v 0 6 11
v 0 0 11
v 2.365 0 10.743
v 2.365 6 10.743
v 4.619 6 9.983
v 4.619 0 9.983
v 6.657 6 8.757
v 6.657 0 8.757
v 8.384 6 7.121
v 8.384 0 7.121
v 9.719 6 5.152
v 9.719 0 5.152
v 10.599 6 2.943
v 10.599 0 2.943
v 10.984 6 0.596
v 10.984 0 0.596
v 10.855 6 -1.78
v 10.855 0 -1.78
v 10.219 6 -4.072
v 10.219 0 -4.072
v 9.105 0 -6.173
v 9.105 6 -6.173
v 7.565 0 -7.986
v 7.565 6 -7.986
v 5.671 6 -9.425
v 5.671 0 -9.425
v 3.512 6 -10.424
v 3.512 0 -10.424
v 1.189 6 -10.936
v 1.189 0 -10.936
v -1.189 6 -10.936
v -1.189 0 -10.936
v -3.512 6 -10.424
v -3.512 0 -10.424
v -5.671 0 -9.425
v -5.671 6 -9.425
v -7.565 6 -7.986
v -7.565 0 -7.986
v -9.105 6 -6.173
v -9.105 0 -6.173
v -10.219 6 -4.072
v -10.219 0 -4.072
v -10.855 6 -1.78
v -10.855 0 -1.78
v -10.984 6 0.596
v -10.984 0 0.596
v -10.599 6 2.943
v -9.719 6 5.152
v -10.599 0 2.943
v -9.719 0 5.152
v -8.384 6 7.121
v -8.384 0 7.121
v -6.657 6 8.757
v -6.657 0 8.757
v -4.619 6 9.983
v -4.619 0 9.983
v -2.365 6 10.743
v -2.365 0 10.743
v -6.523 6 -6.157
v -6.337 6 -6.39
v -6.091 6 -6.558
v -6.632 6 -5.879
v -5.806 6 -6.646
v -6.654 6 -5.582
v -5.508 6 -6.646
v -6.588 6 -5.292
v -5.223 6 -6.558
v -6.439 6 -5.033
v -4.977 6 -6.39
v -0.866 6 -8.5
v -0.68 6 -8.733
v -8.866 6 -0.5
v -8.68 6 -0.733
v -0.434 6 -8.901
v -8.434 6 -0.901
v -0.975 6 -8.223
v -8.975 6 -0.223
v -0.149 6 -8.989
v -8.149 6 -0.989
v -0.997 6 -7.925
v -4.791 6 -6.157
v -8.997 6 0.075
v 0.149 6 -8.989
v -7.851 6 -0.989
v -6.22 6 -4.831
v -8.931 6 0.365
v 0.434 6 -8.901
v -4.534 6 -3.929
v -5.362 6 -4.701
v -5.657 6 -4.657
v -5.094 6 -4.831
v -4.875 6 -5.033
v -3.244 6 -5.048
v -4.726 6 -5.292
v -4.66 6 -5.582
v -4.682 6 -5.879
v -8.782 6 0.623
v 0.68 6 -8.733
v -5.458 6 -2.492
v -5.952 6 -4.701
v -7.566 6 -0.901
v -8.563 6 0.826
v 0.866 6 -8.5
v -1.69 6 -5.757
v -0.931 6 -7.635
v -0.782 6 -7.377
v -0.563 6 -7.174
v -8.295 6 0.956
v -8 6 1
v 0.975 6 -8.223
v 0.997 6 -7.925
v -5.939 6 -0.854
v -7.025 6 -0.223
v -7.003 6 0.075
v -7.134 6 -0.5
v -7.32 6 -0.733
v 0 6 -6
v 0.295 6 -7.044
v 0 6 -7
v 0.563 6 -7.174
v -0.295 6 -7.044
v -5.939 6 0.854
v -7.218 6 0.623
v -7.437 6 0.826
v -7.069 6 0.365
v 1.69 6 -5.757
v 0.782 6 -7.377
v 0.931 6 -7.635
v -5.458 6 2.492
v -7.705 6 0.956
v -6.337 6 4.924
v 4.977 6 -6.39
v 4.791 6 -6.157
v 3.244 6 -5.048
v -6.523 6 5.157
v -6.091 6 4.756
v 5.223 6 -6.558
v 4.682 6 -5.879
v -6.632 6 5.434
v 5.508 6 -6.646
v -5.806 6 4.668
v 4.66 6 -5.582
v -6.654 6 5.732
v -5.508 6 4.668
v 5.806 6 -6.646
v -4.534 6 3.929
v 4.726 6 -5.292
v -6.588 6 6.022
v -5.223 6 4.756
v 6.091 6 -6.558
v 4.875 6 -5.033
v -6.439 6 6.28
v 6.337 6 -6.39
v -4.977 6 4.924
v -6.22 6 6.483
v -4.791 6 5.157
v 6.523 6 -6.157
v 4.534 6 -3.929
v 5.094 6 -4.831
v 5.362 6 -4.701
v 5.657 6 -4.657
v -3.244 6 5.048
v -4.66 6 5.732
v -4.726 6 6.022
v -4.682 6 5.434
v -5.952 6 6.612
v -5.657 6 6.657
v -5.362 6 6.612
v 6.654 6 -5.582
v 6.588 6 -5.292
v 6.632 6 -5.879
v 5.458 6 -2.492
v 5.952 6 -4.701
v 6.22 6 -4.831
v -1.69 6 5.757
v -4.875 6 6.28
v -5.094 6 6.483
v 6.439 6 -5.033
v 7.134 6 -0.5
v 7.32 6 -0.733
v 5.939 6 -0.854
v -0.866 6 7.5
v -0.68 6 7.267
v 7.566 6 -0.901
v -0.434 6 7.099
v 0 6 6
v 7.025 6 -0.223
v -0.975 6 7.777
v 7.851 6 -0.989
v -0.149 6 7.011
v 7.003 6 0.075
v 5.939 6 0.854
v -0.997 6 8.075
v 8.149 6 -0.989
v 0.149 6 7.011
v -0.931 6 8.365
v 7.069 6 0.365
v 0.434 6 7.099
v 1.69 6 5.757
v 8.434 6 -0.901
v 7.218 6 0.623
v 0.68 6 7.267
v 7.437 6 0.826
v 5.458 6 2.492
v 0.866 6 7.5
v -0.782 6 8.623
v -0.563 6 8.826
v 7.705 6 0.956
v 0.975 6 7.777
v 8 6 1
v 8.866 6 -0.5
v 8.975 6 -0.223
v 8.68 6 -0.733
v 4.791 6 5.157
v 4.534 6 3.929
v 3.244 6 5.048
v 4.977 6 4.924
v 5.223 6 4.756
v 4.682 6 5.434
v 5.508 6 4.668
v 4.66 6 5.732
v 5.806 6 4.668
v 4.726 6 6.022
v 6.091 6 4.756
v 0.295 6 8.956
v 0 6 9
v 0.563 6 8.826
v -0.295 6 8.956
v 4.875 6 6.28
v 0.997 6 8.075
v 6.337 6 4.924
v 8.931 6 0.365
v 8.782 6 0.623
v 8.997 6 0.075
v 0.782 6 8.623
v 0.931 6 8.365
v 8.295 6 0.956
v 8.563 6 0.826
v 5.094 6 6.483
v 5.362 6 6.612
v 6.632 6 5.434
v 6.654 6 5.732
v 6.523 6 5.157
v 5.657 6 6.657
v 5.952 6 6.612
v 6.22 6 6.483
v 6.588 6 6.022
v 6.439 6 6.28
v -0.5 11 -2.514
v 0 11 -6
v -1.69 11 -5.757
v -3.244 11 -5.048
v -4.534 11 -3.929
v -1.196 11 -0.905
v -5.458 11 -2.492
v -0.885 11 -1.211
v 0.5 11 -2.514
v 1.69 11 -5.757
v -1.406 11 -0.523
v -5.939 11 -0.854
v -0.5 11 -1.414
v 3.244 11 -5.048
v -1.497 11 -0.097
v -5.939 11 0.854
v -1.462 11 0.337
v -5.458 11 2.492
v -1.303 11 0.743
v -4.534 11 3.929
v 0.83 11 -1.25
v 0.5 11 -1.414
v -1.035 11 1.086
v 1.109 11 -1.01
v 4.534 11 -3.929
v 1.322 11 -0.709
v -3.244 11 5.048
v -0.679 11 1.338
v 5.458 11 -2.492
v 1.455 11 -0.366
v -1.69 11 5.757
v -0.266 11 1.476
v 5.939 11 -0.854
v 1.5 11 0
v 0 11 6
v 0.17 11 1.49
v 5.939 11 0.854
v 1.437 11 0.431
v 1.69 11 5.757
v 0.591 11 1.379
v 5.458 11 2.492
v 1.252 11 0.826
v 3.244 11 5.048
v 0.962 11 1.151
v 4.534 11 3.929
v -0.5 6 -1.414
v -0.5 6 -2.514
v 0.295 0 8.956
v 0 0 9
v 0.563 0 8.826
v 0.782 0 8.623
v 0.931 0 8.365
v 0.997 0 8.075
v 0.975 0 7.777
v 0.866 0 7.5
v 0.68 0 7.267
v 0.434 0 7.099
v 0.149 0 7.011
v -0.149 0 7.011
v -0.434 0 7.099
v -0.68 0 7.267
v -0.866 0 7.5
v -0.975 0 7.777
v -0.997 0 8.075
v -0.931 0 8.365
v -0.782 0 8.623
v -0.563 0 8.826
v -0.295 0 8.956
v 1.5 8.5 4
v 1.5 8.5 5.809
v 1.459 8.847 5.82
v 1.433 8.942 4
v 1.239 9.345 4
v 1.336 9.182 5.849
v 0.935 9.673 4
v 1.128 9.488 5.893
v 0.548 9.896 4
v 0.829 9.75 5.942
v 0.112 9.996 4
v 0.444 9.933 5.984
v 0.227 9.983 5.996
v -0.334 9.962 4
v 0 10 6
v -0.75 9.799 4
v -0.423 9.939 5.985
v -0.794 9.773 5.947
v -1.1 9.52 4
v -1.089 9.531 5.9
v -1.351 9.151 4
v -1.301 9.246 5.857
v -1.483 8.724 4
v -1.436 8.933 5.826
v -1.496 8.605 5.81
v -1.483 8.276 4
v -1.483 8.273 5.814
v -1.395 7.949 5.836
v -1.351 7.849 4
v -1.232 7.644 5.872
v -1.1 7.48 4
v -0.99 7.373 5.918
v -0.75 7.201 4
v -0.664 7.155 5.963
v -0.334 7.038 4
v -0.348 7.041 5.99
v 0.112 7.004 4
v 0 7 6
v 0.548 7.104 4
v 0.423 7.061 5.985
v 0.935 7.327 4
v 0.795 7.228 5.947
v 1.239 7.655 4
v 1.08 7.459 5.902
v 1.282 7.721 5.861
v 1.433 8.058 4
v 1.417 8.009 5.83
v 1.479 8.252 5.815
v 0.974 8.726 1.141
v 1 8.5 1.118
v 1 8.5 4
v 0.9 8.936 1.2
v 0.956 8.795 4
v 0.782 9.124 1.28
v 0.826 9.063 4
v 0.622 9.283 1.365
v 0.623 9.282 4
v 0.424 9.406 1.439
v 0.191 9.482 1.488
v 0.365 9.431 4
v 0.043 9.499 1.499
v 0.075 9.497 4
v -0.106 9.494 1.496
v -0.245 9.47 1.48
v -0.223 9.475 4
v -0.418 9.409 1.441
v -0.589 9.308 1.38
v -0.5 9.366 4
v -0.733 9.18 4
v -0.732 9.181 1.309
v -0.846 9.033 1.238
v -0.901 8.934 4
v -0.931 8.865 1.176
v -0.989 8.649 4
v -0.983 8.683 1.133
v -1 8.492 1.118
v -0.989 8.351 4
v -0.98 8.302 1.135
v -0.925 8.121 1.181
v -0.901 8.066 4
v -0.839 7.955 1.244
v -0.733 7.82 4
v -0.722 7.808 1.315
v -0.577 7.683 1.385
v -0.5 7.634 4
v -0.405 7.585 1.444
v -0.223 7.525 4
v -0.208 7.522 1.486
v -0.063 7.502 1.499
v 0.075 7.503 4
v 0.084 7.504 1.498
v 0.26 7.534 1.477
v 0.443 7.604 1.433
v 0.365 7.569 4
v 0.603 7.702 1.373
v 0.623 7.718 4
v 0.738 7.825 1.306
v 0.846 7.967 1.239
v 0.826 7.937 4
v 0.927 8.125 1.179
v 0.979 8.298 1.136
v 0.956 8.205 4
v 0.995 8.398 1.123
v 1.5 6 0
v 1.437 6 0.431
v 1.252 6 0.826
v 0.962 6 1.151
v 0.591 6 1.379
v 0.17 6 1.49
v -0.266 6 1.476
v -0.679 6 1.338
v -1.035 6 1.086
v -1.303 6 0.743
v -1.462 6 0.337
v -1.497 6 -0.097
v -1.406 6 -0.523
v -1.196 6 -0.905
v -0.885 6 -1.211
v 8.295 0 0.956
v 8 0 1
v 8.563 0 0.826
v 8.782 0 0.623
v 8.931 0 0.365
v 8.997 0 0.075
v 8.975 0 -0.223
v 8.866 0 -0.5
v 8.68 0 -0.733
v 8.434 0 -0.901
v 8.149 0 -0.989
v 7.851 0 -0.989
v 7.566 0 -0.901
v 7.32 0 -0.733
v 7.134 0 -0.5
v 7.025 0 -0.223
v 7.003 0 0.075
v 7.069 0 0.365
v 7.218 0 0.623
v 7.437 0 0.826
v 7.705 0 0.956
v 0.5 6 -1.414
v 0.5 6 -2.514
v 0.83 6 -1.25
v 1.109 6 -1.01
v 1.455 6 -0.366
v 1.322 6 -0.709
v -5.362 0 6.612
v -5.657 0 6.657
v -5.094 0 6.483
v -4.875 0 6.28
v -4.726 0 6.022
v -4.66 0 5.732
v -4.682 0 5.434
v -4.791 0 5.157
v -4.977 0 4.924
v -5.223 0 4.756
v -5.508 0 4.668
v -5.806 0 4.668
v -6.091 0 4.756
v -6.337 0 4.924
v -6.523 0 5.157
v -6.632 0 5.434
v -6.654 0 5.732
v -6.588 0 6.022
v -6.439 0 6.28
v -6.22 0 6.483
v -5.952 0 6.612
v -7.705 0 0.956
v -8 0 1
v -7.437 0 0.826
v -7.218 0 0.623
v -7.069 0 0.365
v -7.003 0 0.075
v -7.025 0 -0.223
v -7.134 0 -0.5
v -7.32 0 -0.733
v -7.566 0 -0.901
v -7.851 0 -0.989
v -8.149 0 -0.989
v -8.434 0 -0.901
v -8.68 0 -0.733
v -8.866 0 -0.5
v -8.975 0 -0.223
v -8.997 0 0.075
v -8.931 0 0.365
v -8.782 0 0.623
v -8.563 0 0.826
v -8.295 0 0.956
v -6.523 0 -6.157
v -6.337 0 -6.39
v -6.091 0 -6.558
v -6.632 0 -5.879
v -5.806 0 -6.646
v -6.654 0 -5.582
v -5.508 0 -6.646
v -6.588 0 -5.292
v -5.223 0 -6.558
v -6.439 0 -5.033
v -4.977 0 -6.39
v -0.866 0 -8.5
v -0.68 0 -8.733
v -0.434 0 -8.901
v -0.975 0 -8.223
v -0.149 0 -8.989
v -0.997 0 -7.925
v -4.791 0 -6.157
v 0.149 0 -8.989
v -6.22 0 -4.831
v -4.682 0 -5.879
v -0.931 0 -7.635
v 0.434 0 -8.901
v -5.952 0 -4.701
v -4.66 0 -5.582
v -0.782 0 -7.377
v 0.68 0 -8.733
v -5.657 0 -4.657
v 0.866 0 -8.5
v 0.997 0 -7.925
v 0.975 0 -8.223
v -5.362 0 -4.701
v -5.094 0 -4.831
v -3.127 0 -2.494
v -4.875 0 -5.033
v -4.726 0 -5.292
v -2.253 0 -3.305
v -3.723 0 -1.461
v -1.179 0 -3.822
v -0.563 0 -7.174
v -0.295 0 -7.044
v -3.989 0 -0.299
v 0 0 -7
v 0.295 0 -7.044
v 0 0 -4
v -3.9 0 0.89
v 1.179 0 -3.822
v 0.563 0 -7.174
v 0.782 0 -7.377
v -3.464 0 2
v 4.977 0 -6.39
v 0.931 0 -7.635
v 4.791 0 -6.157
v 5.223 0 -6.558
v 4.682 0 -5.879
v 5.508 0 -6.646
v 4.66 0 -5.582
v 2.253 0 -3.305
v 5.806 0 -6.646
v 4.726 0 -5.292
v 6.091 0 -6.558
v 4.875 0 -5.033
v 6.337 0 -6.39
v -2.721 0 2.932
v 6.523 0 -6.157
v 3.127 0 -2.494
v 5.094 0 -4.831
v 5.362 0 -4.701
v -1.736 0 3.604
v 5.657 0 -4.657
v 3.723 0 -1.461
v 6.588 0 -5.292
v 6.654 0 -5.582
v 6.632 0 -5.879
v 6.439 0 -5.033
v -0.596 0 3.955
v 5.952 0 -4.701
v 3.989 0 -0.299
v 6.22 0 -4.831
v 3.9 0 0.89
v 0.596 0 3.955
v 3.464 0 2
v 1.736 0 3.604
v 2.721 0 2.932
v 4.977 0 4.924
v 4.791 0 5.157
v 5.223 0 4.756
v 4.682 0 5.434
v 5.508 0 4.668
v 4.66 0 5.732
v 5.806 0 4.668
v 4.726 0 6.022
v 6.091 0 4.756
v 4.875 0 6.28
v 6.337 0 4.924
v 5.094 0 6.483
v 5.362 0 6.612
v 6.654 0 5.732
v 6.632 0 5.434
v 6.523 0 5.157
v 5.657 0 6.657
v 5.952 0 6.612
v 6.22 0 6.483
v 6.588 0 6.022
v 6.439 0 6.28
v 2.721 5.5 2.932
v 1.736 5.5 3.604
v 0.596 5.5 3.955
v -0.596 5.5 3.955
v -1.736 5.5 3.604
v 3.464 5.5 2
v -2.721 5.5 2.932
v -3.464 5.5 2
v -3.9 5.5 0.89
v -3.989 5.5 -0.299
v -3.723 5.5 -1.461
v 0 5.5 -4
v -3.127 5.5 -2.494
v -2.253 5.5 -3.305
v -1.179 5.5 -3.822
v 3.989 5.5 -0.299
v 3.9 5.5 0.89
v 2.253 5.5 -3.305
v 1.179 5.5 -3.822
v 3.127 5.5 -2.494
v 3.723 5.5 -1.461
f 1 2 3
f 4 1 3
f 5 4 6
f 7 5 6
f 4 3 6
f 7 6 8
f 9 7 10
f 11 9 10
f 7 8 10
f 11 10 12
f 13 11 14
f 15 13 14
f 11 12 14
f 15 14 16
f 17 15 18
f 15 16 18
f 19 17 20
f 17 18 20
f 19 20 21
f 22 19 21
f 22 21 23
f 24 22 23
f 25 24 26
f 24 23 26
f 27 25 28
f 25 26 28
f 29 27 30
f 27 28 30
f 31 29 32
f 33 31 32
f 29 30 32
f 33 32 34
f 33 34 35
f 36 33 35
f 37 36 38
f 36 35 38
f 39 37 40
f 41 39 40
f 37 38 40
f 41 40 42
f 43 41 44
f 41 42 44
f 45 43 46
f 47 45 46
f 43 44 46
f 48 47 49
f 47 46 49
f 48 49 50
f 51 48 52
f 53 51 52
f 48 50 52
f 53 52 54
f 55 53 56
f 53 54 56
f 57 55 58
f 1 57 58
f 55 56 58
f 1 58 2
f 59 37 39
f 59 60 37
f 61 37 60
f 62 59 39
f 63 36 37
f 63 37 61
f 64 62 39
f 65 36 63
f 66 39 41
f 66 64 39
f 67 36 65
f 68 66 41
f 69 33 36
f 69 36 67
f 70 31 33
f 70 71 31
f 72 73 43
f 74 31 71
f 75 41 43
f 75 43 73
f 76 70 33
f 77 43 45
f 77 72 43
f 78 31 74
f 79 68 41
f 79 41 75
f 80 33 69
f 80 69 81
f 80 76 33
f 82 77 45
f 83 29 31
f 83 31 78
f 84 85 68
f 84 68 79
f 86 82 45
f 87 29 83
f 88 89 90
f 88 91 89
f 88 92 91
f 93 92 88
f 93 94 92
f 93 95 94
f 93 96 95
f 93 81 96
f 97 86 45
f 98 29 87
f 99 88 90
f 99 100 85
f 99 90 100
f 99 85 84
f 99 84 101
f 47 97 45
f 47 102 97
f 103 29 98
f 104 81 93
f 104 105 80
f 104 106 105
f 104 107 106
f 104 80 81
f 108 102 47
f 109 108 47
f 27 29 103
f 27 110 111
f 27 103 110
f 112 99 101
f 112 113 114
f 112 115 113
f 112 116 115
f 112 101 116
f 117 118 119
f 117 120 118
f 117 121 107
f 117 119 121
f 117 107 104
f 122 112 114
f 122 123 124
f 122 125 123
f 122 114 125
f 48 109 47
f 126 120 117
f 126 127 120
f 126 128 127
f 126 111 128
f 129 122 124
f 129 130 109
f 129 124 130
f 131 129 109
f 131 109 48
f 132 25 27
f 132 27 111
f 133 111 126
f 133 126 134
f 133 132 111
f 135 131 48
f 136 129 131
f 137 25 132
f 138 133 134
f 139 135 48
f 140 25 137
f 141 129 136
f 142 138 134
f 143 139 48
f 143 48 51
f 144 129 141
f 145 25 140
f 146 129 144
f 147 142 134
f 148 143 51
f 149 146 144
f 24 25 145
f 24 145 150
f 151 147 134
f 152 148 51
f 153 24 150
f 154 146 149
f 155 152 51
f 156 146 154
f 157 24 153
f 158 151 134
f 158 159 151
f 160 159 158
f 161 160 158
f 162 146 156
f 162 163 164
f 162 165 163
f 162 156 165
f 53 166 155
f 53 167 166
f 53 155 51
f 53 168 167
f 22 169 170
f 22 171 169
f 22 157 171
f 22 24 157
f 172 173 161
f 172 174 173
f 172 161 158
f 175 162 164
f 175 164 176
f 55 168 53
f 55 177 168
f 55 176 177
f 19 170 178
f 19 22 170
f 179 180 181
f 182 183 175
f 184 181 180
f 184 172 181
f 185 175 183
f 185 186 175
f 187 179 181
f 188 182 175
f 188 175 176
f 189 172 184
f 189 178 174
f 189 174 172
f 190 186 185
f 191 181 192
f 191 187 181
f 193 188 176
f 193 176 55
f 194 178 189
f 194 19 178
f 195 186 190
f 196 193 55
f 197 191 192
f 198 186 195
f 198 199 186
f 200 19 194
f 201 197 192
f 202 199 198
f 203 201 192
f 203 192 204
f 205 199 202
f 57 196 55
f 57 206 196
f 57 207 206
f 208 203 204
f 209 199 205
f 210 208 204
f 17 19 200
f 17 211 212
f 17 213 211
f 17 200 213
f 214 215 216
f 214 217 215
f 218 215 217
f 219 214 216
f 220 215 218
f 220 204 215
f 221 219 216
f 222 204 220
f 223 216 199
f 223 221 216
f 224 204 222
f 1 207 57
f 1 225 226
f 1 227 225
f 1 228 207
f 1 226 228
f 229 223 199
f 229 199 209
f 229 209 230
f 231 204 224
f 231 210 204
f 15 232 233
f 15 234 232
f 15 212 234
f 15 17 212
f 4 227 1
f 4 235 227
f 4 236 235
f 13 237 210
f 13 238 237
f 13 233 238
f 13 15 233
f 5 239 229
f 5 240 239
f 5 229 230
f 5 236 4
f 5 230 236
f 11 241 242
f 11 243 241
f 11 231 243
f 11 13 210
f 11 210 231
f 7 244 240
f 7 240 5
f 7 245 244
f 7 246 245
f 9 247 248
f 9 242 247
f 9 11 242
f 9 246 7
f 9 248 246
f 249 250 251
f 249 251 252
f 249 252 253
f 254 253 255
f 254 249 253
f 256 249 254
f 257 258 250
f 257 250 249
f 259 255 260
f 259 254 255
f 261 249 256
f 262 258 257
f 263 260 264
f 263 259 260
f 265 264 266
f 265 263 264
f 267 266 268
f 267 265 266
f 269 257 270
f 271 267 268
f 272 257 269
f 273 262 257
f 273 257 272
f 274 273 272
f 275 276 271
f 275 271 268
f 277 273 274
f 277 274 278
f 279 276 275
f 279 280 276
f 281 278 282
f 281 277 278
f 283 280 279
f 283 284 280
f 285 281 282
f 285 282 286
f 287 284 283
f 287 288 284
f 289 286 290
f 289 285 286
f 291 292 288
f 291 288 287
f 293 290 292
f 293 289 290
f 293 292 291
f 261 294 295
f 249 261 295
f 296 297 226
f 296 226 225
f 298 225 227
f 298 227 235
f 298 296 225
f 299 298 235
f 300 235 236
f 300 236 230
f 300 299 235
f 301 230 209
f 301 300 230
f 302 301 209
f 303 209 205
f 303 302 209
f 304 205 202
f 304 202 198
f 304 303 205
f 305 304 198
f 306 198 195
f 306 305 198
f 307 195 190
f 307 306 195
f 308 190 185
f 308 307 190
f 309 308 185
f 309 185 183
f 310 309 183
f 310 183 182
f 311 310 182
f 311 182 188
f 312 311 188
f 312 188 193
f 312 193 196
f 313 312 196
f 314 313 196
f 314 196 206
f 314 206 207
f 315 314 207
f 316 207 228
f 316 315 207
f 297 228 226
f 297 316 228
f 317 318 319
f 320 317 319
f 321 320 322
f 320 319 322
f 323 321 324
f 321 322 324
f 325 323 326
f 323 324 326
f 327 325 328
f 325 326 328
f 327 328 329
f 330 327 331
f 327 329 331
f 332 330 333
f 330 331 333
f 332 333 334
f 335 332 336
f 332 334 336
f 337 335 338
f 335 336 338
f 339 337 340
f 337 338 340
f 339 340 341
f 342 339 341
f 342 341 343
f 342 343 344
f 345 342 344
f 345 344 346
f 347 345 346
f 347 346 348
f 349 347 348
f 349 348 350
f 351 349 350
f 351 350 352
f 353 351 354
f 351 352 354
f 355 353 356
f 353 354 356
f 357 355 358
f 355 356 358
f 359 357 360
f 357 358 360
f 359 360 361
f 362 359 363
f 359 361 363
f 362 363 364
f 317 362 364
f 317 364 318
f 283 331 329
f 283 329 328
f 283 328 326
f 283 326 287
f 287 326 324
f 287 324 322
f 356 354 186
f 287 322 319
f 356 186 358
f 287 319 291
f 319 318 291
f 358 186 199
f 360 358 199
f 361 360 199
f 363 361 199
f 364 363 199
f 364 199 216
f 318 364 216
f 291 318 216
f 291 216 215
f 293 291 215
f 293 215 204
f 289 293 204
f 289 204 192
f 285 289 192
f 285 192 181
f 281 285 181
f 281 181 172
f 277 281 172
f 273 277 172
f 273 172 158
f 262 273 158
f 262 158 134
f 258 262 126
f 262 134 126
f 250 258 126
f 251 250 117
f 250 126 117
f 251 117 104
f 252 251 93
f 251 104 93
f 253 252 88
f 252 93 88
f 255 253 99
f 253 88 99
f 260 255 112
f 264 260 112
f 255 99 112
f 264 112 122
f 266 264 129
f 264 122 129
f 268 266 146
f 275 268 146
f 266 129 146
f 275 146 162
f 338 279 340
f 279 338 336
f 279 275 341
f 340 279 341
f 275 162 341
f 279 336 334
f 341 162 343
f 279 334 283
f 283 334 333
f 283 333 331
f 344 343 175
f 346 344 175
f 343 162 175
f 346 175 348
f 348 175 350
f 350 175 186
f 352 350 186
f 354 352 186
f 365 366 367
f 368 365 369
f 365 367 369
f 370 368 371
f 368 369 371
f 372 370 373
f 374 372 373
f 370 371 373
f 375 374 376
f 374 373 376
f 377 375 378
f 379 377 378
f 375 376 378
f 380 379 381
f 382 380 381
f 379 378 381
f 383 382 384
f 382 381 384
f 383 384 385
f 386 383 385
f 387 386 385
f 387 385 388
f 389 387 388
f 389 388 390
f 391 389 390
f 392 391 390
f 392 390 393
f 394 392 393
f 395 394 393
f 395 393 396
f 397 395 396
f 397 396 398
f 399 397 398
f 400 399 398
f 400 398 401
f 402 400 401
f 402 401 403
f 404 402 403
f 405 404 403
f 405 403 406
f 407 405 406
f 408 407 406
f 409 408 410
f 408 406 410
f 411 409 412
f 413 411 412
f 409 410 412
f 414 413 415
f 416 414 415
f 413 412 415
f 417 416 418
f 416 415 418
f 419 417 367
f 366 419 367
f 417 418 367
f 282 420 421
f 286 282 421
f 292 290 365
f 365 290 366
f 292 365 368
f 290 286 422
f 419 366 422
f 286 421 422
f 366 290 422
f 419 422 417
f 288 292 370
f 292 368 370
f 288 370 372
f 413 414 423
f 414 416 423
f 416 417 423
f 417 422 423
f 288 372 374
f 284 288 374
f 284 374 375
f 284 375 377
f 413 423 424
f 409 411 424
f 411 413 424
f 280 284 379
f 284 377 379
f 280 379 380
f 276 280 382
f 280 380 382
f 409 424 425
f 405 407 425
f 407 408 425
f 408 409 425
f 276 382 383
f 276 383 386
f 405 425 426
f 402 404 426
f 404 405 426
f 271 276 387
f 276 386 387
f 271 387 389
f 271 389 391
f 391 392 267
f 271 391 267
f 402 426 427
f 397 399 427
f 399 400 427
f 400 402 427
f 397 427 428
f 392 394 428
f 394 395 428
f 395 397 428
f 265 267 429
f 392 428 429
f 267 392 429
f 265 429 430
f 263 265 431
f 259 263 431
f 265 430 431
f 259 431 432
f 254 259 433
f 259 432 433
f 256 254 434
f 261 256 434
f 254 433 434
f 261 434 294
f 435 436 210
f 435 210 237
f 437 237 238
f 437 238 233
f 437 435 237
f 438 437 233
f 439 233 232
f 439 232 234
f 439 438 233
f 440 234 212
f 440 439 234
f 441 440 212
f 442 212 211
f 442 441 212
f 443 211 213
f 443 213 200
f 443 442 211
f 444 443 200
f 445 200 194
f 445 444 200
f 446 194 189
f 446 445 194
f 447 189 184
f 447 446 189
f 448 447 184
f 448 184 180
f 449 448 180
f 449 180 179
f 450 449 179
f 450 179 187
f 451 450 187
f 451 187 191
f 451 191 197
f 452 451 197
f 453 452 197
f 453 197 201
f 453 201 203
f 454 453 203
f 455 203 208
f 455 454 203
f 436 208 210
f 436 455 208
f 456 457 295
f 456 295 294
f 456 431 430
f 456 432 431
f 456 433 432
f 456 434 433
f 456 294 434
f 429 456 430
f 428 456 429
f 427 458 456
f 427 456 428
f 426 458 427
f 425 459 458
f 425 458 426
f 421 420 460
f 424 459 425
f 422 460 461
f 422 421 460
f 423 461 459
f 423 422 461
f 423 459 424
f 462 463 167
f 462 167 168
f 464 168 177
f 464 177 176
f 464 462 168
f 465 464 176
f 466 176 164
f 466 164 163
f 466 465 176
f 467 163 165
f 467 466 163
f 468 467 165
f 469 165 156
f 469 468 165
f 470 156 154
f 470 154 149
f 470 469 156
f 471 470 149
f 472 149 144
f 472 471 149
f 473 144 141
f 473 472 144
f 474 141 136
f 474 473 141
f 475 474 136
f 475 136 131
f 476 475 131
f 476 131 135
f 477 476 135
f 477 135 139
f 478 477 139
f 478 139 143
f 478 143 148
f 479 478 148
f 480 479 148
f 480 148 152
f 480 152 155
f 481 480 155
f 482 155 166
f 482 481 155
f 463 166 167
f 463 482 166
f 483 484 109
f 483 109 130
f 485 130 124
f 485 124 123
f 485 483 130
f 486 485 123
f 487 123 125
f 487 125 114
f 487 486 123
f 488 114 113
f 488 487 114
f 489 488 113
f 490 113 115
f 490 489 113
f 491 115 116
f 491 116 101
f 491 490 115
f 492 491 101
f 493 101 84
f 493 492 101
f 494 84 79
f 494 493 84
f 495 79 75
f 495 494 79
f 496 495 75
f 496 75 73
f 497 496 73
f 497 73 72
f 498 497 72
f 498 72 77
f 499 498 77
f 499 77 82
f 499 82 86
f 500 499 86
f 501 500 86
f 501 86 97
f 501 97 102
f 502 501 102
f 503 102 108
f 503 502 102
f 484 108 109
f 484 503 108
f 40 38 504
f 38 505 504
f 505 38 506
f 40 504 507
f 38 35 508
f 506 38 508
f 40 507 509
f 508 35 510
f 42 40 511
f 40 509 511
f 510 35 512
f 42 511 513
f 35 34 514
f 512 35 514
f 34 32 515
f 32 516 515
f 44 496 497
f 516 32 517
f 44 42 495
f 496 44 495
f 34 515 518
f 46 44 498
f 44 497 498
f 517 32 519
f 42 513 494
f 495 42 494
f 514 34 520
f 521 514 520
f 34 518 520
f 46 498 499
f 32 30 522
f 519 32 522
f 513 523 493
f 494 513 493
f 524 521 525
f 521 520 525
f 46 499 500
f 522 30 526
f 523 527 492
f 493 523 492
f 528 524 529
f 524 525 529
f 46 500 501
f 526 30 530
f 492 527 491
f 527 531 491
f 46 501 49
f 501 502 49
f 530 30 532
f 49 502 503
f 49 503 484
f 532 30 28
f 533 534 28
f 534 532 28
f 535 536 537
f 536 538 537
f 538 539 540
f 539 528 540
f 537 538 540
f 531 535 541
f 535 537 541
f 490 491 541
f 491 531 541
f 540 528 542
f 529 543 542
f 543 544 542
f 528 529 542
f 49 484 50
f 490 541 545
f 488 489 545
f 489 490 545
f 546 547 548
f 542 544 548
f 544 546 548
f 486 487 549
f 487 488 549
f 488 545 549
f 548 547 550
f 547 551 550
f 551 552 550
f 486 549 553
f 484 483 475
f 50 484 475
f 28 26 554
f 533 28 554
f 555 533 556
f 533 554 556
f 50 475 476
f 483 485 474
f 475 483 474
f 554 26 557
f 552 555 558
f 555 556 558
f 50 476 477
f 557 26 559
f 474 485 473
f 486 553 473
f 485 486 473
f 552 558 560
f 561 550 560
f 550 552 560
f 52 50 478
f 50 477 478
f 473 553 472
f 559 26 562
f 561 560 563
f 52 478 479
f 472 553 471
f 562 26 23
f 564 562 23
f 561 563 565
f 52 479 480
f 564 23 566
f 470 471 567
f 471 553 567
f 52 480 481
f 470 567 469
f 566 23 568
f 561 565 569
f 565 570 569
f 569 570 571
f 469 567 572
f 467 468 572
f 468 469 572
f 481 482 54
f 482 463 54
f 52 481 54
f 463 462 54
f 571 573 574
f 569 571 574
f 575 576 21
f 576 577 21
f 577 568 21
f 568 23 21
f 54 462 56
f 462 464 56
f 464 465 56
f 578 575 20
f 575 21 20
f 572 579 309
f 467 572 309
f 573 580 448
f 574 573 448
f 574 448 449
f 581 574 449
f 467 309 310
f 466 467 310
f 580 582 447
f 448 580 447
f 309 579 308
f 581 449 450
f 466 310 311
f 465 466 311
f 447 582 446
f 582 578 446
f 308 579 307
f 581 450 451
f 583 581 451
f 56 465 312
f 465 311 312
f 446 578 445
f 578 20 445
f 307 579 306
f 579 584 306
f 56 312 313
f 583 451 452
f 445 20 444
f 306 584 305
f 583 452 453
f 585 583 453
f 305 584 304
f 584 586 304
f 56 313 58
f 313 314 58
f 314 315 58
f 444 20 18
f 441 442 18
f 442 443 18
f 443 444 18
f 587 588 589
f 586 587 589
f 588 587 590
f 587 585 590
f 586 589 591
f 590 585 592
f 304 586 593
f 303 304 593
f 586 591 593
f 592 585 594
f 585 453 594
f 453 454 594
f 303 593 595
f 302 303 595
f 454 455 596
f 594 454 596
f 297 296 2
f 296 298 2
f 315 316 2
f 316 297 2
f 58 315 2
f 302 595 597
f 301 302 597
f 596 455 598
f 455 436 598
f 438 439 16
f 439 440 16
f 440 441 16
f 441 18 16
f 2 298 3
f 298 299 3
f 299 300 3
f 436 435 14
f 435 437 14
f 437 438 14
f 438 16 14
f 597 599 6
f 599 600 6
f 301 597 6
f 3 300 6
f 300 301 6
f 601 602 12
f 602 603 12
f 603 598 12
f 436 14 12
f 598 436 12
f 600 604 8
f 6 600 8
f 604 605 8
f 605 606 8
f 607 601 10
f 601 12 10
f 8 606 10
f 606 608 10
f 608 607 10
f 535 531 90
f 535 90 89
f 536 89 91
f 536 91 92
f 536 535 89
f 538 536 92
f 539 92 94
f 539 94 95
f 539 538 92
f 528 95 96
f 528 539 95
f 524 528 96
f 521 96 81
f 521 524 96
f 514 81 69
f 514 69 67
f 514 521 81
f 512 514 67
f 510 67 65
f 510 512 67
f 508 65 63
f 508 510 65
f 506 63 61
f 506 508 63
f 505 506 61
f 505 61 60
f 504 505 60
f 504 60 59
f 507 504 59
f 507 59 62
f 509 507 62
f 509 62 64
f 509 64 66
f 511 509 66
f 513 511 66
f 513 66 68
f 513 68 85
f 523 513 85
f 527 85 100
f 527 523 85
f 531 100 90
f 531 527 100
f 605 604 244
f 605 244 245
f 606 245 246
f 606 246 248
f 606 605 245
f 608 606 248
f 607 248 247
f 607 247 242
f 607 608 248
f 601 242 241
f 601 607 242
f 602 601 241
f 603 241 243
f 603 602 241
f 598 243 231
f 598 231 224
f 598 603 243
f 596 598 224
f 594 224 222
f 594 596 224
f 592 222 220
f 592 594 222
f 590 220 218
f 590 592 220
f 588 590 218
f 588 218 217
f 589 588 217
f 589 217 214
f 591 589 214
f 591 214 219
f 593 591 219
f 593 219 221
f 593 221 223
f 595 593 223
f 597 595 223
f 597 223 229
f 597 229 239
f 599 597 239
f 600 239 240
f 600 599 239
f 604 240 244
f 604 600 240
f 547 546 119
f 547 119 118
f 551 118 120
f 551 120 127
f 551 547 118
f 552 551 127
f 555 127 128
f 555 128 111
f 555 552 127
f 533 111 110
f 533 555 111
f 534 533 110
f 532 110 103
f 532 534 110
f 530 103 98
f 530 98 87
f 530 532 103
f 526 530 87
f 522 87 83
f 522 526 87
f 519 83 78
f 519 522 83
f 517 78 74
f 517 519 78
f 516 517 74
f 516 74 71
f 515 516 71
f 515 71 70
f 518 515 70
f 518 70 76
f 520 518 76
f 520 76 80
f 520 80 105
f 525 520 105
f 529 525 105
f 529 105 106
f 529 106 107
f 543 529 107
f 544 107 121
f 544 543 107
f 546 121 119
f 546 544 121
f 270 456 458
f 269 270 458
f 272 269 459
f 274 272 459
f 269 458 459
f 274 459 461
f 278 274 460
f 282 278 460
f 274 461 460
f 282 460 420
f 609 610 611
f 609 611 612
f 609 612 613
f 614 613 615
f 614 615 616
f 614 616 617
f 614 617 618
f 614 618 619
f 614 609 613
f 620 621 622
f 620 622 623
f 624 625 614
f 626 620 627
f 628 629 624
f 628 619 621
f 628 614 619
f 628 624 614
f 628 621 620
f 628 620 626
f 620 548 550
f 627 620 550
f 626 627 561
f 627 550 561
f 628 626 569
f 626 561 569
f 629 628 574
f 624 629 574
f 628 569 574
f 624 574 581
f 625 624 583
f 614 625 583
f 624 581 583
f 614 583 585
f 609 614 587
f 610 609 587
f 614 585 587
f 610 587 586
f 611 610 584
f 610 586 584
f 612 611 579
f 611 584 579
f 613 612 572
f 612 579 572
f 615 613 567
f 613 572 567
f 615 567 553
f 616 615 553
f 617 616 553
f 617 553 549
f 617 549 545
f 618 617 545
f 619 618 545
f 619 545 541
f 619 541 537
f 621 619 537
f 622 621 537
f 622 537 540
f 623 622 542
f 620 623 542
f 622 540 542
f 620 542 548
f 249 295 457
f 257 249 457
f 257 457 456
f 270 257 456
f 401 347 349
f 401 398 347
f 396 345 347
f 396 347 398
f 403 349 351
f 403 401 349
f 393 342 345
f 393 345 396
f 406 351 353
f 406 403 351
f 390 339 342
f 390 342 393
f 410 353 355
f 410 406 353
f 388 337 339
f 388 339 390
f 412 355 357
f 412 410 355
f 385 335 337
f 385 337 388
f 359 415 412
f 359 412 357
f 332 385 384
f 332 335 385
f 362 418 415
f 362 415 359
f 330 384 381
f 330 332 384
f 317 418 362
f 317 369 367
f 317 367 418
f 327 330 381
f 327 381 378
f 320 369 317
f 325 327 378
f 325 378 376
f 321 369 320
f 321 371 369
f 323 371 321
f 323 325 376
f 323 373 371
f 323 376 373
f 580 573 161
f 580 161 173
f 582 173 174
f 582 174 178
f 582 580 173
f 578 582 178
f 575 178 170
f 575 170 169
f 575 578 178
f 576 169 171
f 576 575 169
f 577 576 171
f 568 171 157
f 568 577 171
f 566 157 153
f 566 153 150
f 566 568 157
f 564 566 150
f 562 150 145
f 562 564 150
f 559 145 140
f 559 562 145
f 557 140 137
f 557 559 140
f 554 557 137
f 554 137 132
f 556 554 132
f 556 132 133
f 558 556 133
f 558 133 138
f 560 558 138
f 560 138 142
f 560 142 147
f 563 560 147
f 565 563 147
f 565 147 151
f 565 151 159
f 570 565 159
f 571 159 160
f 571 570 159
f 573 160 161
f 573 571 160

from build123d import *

# Parameters (mm, degrees)
SKETCH1_R           = 11
SKETCH1_R_2         = 1
BOSS_EXTRUDE1_DEPTH = 6
SKETCH2_R           = 4
CUT_EXTRUDE1_DEPTH  = 5.5
SKETCH3_R           = 6
BOSS_EXTRUDE2_DEPTH = 5
SKETCH6_R           = 1
CUT_EXTRUDE2_DEPTH  = 6
SKETCH6_3_R         = 1.5
SKETCH6_3_R_2       = 1
CUT_EXTRUDE3_DEPTH  = 2


with BuildPart() as part:
    # Sketch1 → Boss-Extrude1 (new body)
    with BuildSketch(Plane(origin=(0, 0, 0), x_dir=(1, 0, 0), z_dir=(0, 1, 0))):
        Circle(SKETCH1_R)
        with Locations((0, 8)):
            Circle(SKETCH1_R_2, mode=Mode.SUBTRACT)
        with Locations((5.656854249, 5.656854249)):
            Circle(SKETCH1_R_2, mode=Mode.SUBTRACT)
        with Locations((8, 0)):
            Circle(SKETCH1_R_2, mode=Mode.SUBTRACT)
        with Locations((5.656854249, -5.656854249)):
            Circle(SKETCH1_R_2, mode=Mode.SUBTRACT)
        with Locations((0, -8)):
            Circle(SKETCH1_R_2, mode=Mode.SUBTRACT)
        with Locations((-5.656854249, -5.656854249)):
            Circle(SKETCH1_R_2, mode=Mode.SUBTRACT)
        with Locations((-8, 0)):
            Circle(SKETCH1_R_2, mode=Mode.SUBTRACT)
        with Locations((-5.656854249, 5.656854249)):
            Circle(SKETCH1_R_2, mode=Mode.SUBTRACT)
    extrude(amount=BOSS_EXTRUDE1_DEPTH)

    # Sketch2 → Cut-Extrude1 (cut)
    with BuildSketch(Plane.XZ):
        Circle(SKETCH2_R)
    extrude(amount=-CUT_EXTRUDE1_DEPTH, mode=Mode.SUBTRACT)

    # Sketch3 → Boss-Extrude2 (add)
    with BuildSketch(Plane(origin=(0, 6, 0), x_dir=(1, 0, 0), z_dir=(0, 1, 0))):
        Circle(SKETCH3_R)
        with BuildLine():
            ThreePointArc((1.5, 0), (-0.866025404, -1.224744871), (-0.5, 1.414213562))
            Line((-0.5, 1.414213562), (-0.5, 2.514213562))
            Line((-0.5, 2.514213562), (0.5, 2.514213562))
            Line((0.5, 2.514213562), (0.5, 1.414213562))
            ThreePointArc((0.5, 1.414213562), (1.224744871, 0.866025404), (1.5, 0))
        make_face(mode=Mode.SUBTRACT)
    extrude(amount=BOSS_EXTRUDE2_DEPTH)

    # Sketch6 → Cut-Extrude2 (cut)
    with BuildSketch(Plane.XY.offset(6)):
        with Locations((0, 8.5)):
            Circle(SKETCH6_R)
    extrude(amount=-CUT_EXTRUDE2_DEPTH, mode=Mode.SUBTRACT)

    # Sketch6<3> → Cut-Extrude3 (cut)
    with BuildSketch(Plane.XY.offset(6)):
        with Locations((0, 8.5)):
            Circle(SKETCH6_3_R)
        with Locations((0, 8.5)):
            Circle(SKETCH6_3_R_2, mode=Mode.SUBTRACT)
    extrude(amount=-CUT_EXTRUDE3_DEPTH, mode=Mode.SUBTRACT)


solid = part.part
